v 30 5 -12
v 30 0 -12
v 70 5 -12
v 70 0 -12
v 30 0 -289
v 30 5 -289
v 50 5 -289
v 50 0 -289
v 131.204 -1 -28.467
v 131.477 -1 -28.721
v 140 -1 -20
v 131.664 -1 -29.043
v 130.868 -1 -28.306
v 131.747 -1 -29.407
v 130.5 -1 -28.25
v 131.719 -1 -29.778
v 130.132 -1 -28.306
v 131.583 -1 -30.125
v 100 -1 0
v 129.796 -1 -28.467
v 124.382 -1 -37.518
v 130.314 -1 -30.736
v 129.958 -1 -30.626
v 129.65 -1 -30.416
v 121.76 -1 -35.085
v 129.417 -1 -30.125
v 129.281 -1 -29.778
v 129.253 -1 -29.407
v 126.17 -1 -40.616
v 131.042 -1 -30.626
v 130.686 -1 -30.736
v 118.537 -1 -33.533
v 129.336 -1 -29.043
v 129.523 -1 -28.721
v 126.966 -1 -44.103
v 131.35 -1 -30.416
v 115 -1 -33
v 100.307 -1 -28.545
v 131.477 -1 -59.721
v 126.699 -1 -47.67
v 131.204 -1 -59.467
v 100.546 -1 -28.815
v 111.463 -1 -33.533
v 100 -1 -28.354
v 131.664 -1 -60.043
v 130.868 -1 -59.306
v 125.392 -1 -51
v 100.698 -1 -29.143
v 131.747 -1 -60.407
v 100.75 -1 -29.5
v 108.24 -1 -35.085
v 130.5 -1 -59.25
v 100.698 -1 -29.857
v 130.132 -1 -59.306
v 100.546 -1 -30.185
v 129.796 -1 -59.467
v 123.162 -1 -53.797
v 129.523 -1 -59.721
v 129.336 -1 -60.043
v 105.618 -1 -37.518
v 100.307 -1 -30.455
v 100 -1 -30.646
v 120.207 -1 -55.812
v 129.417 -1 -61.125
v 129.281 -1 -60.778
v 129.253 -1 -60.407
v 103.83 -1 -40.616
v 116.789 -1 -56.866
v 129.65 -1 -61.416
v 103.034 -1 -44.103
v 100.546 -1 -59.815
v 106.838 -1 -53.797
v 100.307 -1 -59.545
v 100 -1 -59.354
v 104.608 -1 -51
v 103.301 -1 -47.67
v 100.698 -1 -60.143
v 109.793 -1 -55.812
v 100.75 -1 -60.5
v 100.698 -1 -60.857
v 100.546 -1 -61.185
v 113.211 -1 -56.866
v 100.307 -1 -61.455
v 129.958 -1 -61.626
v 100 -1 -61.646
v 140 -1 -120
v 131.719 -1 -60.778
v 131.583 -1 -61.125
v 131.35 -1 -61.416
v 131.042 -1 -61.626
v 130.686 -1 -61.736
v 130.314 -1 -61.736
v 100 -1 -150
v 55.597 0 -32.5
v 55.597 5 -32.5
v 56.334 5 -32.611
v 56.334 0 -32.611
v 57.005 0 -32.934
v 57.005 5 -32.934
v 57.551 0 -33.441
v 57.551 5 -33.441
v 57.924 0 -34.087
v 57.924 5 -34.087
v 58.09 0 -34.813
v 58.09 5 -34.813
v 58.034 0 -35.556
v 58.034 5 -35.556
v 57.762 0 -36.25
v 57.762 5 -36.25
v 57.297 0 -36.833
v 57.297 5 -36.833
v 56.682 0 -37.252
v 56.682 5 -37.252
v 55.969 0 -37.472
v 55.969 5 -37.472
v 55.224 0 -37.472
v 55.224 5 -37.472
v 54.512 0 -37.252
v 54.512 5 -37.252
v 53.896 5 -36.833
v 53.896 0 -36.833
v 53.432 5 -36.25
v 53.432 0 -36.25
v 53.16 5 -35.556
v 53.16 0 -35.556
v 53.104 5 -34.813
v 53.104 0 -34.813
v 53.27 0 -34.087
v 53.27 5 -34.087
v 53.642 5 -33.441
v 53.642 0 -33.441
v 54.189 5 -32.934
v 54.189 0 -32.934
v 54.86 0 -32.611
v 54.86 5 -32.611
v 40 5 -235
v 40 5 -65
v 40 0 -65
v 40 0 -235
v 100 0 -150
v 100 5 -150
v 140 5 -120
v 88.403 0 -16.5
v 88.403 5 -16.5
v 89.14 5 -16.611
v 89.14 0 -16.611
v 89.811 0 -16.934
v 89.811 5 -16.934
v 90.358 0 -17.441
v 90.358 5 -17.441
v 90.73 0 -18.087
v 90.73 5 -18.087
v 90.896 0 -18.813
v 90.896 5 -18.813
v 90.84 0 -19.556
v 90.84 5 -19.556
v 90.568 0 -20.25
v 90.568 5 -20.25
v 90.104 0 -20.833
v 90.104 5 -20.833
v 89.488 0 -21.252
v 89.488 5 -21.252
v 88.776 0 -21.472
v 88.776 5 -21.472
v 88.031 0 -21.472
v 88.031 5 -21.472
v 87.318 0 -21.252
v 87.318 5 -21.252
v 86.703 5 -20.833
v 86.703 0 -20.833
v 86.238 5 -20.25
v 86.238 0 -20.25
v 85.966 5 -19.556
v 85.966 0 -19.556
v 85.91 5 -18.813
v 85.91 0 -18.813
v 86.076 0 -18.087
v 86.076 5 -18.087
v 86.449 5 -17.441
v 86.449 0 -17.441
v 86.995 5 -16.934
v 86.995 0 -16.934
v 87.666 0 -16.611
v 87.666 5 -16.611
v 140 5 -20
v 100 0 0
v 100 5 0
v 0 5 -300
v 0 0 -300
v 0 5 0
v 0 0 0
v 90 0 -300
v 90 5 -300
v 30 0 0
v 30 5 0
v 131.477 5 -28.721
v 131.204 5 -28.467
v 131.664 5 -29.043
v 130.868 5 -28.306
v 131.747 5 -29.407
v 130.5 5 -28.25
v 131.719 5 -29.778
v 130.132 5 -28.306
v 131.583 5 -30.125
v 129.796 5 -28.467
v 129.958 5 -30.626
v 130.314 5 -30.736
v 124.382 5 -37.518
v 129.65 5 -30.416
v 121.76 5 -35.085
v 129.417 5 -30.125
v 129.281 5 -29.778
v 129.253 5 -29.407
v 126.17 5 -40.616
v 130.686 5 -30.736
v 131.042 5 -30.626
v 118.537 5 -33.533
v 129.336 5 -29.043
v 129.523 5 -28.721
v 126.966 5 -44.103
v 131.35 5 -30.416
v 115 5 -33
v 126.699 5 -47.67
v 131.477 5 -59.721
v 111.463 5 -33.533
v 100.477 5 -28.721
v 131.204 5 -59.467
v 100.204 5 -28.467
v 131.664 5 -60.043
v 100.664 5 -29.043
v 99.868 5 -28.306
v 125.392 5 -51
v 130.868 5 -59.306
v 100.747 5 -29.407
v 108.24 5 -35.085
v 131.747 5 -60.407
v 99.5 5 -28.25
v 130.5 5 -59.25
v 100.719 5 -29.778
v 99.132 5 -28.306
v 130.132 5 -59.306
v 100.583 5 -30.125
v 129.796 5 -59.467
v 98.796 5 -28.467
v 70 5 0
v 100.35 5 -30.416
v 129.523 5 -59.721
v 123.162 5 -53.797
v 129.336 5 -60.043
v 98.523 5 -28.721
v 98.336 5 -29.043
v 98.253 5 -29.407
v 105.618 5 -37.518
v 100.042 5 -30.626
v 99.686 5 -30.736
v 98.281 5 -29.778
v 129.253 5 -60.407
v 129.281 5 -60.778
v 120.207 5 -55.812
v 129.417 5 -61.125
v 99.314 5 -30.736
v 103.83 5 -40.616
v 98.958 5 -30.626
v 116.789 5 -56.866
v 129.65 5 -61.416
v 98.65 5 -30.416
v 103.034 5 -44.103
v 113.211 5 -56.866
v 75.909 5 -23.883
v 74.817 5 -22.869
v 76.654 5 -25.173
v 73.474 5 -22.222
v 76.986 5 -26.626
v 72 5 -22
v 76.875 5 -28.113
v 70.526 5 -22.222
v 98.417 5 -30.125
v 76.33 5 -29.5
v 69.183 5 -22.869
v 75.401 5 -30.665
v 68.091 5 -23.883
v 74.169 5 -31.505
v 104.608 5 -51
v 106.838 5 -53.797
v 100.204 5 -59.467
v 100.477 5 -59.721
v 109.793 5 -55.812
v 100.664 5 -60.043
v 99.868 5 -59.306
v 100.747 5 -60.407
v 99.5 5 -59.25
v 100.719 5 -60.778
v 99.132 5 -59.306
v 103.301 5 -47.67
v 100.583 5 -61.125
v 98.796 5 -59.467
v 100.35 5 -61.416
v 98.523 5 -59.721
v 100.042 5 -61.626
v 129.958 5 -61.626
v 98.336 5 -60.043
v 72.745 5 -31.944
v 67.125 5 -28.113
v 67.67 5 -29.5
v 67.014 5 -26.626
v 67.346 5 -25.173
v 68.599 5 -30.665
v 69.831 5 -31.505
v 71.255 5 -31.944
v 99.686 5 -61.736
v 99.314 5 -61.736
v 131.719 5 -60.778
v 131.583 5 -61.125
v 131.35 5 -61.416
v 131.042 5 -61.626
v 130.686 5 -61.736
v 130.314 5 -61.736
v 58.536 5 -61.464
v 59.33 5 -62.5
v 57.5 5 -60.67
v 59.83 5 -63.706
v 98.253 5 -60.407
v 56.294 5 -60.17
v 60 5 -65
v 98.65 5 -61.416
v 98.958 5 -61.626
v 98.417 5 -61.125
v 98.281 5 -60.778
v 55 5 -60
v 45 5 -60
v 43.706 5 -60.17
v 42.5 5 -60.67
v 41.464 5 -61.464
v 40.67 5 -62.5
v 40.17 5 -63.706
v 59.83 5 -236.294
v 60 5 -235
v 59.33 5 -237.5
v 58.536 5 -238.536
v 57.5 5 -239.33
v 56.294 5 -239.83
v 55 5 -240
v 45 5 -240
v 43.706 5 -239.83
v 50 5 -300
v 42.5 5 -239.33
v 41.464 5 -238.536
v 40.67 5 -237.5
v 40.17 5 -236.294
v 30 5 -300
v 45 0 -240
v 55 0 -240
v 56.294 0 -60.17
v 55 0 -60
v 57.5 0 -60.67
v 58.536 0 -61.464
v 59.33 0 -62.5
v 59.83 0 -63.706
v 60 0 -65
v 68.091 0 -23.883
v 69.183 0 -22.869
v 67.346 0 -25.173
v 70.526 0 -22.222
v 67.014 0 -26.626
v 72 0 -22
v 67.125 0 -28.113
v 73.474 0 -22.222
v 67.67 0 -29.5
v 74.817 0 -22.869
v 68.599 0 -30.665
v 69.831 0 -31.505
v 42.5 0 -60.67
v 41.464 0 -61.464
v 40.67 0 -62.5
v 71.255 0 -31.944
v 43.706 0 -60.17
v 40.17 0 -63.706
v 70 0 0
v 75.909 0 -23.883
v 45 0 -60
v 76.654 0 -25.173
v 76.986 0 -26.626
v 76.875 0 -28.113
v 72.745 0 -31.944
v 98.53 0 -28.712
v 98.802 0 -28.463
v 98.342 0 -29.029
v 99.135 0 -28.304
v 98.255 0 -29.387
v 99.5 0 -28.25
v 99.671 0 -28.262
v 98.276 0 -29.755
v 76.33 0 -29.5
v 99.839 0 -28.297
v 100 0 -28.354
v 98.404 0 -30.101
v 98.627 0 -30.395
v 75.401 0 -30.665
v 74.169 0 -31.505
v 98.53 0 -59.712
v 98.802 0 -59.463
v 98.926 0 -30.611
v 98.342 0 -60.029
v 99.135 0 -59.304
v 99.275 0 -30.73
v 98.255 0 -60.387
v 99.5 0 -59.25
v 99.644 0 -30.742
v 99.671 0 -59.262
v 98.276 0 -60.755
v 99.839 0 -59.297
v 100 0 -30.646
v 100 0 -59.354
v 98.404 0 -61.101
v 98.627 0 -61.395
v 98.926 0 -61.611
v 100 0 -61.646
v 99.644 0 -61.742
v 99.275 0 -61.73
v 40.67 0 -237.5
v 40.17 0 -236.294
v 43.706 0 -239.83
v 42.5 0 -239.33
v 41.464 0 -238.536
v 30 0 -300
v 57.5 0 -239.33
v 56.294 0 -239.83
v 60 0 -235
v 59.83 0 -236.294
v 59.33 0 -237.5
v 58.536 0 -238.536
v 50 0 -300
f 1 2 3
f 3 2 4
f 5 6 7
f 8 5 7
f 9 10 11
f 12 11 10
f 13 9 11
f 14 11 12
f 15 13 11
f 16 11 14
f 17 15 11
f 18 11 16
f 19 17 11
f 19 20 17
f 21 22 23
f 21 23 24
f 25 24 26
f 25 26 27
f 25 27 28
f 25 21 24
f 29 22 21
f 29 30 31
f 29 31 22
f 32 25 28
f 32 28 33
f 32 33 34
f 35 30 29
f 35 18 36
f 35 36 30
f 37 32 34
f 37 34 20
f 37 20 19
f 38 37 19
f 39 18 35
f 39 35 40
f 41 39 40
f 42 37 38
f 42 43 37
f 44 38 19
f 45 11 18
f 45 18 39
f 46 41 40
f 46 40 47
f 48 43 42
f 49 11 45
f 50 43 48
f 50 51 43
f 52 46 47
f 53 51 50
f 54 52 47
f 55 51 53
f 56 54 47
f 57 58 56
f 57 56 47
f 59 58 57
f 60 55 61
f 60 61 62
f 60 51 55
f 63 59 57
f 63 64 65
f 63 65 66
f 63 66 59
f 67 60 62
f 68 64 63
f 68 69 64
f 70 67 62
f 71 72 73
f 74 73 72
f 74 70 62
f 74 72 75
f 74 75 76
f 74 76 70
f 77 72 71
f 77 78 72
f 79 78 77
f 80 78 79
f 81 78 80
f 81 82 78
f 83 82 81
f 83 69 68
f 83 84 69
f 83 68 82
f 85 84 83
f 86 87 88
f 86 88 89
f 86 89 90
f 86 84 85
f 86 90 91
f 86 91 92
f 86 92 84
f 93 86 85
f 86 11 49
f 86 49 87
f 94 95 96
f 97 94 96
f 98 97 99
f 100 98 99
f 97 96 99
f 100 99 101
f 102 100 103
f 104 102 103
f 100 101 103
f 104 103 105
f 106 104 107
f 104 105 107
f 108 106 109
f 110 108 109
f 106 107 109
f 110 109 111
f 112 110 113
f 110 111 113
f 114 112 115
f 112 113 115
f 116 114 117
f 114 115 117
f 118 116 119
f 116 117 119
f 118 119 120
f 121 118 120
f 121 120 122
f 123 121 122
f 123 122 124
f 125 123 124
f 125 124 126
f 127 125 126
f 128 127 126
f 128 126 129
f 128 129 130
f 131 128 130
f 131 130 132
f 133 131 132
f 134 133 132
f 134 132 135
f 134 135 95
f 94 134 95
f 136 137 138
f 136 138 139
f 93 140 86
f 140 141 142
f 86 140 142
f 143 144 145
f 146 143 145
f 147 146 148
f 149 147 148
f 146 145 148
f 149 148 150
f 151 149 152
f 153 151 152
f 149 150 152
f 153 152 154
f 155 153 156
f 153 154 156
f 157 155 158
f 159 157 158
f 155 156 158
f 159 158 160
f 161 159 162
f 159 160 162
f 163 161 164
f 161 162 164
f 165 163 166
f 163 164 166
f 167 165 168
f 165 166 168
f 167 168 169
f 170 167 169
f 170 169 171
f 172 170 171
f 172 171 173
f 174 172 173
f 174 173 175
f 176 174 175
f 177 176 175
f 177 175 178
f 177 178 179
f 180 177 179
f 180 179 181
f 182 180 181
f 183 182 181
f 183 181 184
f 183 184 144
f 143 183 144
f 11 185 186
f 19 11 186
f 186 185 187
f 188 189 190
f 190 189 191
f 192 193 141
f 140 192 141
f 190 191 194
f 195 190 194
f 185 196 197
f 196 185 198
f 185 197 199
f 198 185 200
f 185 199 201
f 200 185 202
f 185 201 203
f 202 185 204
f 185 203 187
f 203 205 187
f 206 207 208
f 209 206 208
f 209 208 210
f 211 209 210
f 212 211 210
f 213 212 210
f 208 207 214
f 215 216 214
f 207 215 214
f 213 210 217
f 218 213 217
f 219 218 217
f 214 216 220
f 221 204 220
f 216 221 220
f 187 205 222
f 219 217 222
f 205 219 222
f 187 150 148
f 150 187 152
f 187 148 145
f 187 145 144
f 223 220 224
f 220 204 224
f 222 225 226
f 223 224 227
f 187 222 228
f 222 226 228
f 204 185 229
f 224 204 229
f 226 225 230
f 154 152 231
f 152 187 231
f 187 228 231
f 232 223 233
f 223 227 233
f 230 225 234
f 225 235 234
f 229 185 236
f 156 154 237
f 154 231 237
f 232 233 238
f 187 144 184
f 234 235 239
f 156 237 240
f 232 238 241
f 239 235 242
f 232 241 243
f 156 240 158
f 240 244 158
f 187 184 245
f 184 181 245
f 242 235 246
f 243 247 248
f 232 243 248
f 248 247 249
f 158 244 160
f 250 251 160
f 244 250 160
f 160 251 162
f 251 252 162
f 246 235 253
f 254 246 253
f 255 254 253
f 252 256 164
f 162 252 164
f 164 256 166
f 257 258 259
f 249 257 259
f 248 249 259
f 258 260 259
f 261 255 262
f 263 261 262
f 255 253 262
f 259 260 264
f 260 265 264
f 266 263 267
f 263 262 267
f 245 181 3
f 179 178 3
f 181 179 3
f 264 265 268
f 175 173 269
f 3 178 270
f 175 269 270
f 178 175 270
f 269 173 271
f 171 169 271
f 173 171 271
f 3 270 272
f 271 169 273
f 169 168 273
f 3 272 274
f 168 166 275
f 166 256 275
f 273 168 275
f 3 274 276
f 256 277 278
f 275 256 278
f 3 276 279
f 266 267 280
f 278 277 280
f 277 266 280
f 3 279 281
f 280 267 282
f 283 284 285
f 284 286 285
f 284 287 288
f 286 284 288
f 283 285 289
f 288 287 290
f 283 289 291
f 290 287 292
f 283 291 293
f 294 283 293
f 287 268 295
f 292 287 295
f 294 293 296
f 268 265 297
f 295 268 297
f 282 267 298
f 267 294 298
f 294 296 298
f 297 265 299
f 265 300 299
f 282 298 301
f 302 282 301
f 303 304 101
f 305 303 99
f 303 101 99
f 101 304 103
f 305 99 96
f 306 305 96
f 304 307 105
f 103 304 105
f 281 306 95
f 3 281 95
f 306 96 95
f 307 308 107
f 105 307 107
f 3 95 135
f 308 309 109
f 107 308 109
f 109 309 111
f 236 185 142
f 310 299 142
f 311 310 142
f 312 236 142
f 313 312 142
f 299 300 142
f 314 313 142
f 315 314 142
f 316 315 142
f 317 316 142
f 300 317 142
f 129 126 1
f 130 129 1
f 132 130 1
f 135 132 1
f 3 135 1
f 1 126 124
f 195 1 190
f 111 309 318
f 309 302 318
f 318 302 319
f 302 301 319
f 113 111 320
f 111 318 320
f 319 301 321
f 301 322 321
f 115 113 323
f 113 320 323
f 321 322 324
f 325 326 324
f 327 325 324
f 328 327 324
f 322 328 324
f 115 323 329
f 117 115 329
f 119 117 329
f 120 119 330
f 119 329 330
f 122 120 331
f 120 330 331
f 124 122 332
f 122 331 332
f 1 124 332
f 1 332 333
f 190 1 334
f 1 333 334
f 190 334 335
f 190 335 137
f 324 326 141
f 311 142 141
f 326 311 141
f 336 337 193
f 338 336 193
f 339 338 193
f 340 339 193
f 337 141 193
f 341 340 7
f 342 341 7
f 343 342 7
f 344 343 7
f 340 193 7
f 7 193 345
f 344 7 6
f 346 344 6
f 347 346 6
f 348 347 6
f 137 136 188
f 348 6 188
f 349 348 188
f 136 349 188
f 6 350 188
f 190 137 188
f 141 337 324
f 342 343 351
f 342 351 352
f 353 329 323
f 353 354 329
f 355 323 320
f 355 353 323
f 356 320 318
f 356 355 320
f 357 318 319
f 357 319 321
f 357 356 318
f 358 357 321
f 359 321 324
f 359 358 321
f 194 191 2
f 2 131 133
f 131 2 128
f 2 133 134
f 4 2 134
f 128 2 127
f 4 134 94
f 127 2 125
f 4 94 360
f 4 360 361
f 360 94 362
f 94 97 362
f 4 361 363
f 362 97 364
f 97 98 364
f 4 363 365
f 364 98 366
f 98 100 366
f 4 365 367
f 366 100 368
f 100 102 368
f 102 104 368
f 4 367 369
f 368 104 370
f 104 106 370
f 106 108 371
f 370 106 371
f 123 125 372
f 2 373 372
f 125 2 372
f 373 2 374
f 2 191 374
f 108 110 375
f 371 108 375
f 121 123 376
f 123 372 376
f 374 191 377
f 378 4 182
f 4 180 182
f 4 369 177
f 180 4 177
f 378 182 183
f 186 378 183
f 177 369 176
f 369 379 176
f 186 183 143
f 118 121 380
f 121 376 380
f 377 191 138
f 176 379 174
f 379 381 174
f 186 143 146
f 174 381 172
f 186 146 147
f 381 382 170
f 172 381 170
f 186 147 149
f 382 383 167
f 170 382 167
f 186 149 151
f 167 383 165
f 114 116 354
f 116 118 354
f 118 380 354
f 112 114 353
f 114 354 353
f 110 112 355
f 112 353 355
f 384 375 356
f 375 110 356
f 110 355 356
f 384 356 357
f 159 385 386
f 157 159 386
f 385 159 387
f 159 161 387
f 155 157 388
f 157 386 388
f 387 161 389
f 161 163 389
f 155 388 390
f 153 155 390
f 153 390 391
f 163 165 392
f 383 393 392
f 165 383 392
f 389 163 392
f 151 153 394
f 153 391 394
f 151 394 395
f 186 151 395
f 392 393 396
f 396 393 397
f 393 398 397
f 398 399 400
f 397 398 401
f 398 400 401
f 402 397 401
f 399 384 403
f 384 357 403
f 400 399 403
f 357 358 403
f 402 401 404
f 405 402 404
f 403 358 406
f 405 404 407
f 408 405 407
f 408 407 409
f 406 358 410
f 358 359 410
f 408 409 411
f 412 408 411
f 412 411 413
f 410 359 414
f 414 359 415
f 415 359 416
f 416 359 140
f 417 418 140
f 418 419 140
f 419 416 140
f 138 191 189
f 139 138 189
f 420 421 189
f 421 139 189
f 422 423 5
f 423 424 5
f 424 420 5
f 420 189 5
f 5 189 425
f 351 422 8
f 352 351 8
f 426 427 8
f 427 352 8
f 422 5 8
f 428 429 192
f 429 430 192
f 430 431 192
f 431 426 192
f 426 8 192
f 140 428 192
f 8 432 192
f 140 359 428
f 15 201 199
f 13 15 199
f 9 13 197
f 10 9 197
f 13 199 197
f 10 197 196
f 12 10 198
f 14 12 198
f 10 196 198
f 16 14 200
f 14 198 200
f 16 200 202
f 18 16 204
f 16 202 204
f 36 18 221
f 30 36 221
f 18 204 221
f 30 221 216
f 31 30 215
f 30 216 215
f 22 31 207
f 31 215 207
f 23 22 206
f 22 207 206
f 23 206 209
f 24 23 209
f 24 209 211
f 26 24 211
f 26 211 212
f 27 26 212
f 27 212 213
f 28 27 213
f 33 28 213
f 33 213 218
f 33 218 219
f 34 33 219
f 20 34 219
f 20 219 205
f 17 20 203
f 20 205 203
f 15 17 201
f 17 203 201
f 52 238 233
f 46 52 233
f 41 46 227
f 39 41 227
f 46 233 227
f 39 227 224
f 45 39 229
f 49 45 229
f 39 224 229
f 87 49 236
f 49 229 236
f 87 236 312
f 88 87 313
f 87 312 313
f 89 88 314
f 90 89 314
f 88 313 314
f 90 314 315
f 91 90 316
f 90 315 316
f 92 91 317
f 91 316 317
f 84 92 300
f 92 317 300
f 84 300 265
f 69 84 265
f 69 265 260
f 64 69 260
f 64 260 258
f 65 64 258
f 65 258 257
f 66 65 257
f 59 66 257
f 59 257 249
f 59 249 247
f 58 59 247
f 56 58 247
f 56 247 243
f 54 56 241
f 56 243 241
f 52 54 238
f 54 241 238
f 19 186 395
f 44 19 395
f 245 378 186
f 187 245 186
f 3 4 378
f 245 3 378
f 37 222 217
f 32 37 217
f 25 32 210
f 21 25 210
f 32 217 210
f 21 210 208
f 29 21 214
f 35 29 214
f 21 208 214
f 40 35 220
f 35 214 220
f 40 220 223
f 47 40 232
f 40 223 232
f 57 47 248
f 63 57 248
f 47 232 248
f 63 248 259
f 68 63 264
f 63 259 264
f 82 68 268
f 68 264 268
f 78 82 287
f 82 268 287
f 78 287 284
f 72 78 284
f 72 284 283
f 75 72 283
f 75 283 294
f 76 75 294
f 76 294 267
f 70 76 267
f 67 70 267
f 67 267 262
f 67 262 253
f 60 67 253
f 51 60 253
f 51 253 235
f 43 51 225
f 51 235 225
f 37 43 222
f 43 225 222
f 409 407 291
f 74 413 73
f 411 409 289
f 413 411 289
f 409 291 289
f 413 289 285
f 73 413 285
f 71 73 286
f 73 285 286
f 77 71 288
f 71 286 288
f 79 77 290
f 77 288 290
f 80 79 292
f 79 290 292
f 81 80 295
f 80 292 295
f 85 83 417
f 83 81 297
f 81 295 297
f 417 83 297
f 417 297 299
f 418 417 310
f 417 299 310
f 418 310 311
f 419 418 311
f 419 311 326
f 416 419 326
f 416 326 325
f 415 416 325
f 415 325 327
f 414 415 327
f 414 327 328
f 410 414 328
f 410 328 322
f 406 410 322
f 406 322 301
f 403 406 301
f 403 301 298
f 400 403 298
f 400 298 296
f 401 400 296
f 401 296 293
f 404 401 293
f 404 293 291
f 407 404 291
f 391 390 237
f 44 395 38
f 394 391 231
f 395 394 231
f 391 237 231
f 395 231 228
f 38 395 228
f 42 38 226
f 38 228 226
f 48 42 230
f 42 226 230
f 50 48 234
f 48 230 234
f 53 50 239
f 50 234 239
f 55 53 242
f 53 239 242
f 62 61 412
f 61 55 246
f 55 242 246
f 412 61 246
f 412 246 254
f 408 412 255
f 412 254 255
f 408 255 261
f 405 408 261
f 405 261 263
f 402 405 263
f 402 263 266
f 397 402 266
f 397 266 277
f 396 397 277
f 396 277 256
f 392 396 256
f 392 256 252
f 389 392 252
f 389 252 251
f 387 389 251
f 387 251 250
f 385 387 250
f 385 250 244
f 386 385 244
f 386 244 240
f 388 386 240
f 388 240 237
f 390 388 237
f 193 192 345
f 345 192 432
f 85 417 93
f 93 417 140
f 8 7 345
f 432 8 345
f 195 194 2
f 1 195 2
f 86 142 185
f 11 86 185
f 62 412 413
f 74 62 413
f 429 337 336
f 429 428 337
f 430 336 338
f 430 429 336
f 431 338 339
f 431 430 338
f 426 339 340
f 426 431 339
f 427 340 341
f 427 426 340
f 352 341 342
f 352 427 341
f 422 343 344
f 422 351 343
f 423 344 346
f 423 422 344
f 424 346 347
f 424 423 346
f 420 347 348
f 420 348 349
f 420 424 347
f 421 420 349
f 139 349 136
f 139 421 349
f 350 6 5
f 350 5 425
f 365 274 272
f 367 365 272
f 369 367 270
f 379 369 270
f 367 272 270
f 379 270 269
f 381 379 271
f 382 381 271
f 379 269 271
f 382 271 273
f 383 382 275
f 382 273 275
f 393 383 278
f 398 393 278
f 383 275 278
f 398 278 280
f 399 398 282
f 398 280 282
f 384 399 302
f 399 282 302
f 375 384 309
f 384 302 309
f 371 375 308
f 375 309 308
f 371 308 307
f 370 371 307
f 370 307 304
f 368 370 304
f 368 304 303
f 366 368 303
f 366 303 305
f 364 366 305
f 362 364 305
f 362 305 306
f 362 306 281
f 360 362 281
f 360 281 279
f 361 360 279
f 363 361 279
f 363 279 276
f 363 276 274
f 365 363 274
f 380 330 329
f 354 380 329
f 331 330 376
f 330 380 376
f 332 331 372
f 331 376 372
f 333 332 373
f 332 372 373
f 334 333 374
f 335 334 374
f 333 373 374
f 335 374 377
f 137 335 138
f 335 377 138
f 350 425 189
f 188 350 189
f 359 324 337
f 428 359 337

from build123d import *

# Parameters (mm, degrees)
BOSS_EXTRUDE1_DEPTH = 5
SKETCH2_R           = 5
SKETCH2_R_2         = 2.5
CUT_EXTRUDE1_DEPTH  = 6
SKETCH4_W           = 20
SKETCH4_H           = 11
CUT_EXTRUDE3_DEPTH  = 10
BOSS_EXTRUDE3_DEPTH = 6
SKETCH7_R           = 1.25
SKETCH7_R_2         = 12
CUT_EXTRUDE4_DEPTH  = 6
SKETCH9_W           = 20
SKETCH9_H           = 180
CUT_EXTRUDE5_DEPTH  = 6
FILLET1_R           = 5


with BuildPart() as part:
    # Sketch1 → Boss-Extrude1 (new body)
    with BuildSketch(Plane(origin=(0, 0, 0), x_dir=(1, 0, 0), z_dir=(0, 1, 0))):
        Polygon((0, 0), (30, 0), (30, 12), (70, 12), (70, 0), (100, 0), (100, 300), (0, 300), align=None)
    extrude(amount=BOSS_EXTRUDE1_DEPTH)

    # Sketch2 → Cut-Extrude1 (cut)
    with BuildSketch(Plane(origin=(0, 5, 0), x_dir=(1, 0, 0), z_dir=(0, 1, 0))):
        with Locations(Location((72, 27, 0), (0, 0, 270))):
            Circle(SKETCH2_R)
        with Locations(Location((88.403124702, 19, 0), (0, 0, 270))):
            Circle(SKETCH2_R_2)
        with Locations(Location((55.596875298, 35, 0), (0, 0, 270))):
            Circle(SKETCH2_R_2)
    extrude(amount=-CUT_EXTRUDE1_DEPTH, mode=Mode.SUBTRACT)

    # Sketch4 → Cut-Extrude3 (cut)
    with BuildSketch(Plane(origin=(0, 5, 0), x_dir=(1, 0, 0), z_dir=(0, 1, 0))):
        with Locations((40, 294.5)):
            Rectangle(SKETCH4_W, SKETCH4_H)
    extrude(amount=-CUT_EXTRUDE3_DEPTH, mode=Mode.SUBTRACT)

    # Sketch6 → Boss-Extrude3 (add)
    with BuildSketch(Plane(origin=(0, 5, 0), x_dir=(1, 0, 0), z_dir=(0, 1, 0))):
        Polygon((100, 0), (100, 150), (140, 120), (140, 20), align=None)
    extrude(amount=-BOSS_EXTRUDE3_DEPTH)

    # Sketch7 → Cut-Extrude4 (cut)
    with BuildSketch(Plane(origin=(0, 5, 0), x_dir=(1, 0, 0), z_dir=(0, 1, 0))):
        with Locations(Location((130.5, 60.5, 0), (0, 0, 270))):
            Circle(SKETCH7_R)
        with Locations(Location((99.5, 60.5, 0), (0, 0, 270))):
            Circle(SKETCH7_R)
        with Locations(Location((99.5, 29.5, 0), (0, 0, 270))):
            Circle(SKETCH7_R)
        with Locations(Location((130.5, 29.5, 0), (0, 0, 270))):
            Circle(SKETCH7_R)
        with Locations(Location((115, 45, 0), (0, 0, 270))):
            Circle(SKETCH7_R_2)
    extrude(amount=-CUT_EXTRUDE4_DEPTH, mode=Mode.SUBTRACT)

    # Sketch9 → Cut-Extrude5 (cut)
    with BuildSketch(Plane(origin=(0, 5, 0), x_dir=(1, 0, 0), z_dir=(0, 1, 0))):
        Polygon((100, 300), (90, 300), (100, 150), align=None)
        with Locations((50, 150)):
            Rectangle(SKETCH9_W, SKETCH9_H)
    extrude(amount=-CUT_EXTRUDE5_DEPTH, mode=Mode.SUBTRACT)

    # Fillet1
    fillet1_edges = [part.edges().sort_by_distance(p)[0] for p in [
        (60, 2.5, -240),
        (60, 2.5, -60),
        (40, 2.5, -60),
        (40, 2.5, -240),
    ]]
    fillet(fillet1_edges, radius=FILLET1_R)


solid = part.part
